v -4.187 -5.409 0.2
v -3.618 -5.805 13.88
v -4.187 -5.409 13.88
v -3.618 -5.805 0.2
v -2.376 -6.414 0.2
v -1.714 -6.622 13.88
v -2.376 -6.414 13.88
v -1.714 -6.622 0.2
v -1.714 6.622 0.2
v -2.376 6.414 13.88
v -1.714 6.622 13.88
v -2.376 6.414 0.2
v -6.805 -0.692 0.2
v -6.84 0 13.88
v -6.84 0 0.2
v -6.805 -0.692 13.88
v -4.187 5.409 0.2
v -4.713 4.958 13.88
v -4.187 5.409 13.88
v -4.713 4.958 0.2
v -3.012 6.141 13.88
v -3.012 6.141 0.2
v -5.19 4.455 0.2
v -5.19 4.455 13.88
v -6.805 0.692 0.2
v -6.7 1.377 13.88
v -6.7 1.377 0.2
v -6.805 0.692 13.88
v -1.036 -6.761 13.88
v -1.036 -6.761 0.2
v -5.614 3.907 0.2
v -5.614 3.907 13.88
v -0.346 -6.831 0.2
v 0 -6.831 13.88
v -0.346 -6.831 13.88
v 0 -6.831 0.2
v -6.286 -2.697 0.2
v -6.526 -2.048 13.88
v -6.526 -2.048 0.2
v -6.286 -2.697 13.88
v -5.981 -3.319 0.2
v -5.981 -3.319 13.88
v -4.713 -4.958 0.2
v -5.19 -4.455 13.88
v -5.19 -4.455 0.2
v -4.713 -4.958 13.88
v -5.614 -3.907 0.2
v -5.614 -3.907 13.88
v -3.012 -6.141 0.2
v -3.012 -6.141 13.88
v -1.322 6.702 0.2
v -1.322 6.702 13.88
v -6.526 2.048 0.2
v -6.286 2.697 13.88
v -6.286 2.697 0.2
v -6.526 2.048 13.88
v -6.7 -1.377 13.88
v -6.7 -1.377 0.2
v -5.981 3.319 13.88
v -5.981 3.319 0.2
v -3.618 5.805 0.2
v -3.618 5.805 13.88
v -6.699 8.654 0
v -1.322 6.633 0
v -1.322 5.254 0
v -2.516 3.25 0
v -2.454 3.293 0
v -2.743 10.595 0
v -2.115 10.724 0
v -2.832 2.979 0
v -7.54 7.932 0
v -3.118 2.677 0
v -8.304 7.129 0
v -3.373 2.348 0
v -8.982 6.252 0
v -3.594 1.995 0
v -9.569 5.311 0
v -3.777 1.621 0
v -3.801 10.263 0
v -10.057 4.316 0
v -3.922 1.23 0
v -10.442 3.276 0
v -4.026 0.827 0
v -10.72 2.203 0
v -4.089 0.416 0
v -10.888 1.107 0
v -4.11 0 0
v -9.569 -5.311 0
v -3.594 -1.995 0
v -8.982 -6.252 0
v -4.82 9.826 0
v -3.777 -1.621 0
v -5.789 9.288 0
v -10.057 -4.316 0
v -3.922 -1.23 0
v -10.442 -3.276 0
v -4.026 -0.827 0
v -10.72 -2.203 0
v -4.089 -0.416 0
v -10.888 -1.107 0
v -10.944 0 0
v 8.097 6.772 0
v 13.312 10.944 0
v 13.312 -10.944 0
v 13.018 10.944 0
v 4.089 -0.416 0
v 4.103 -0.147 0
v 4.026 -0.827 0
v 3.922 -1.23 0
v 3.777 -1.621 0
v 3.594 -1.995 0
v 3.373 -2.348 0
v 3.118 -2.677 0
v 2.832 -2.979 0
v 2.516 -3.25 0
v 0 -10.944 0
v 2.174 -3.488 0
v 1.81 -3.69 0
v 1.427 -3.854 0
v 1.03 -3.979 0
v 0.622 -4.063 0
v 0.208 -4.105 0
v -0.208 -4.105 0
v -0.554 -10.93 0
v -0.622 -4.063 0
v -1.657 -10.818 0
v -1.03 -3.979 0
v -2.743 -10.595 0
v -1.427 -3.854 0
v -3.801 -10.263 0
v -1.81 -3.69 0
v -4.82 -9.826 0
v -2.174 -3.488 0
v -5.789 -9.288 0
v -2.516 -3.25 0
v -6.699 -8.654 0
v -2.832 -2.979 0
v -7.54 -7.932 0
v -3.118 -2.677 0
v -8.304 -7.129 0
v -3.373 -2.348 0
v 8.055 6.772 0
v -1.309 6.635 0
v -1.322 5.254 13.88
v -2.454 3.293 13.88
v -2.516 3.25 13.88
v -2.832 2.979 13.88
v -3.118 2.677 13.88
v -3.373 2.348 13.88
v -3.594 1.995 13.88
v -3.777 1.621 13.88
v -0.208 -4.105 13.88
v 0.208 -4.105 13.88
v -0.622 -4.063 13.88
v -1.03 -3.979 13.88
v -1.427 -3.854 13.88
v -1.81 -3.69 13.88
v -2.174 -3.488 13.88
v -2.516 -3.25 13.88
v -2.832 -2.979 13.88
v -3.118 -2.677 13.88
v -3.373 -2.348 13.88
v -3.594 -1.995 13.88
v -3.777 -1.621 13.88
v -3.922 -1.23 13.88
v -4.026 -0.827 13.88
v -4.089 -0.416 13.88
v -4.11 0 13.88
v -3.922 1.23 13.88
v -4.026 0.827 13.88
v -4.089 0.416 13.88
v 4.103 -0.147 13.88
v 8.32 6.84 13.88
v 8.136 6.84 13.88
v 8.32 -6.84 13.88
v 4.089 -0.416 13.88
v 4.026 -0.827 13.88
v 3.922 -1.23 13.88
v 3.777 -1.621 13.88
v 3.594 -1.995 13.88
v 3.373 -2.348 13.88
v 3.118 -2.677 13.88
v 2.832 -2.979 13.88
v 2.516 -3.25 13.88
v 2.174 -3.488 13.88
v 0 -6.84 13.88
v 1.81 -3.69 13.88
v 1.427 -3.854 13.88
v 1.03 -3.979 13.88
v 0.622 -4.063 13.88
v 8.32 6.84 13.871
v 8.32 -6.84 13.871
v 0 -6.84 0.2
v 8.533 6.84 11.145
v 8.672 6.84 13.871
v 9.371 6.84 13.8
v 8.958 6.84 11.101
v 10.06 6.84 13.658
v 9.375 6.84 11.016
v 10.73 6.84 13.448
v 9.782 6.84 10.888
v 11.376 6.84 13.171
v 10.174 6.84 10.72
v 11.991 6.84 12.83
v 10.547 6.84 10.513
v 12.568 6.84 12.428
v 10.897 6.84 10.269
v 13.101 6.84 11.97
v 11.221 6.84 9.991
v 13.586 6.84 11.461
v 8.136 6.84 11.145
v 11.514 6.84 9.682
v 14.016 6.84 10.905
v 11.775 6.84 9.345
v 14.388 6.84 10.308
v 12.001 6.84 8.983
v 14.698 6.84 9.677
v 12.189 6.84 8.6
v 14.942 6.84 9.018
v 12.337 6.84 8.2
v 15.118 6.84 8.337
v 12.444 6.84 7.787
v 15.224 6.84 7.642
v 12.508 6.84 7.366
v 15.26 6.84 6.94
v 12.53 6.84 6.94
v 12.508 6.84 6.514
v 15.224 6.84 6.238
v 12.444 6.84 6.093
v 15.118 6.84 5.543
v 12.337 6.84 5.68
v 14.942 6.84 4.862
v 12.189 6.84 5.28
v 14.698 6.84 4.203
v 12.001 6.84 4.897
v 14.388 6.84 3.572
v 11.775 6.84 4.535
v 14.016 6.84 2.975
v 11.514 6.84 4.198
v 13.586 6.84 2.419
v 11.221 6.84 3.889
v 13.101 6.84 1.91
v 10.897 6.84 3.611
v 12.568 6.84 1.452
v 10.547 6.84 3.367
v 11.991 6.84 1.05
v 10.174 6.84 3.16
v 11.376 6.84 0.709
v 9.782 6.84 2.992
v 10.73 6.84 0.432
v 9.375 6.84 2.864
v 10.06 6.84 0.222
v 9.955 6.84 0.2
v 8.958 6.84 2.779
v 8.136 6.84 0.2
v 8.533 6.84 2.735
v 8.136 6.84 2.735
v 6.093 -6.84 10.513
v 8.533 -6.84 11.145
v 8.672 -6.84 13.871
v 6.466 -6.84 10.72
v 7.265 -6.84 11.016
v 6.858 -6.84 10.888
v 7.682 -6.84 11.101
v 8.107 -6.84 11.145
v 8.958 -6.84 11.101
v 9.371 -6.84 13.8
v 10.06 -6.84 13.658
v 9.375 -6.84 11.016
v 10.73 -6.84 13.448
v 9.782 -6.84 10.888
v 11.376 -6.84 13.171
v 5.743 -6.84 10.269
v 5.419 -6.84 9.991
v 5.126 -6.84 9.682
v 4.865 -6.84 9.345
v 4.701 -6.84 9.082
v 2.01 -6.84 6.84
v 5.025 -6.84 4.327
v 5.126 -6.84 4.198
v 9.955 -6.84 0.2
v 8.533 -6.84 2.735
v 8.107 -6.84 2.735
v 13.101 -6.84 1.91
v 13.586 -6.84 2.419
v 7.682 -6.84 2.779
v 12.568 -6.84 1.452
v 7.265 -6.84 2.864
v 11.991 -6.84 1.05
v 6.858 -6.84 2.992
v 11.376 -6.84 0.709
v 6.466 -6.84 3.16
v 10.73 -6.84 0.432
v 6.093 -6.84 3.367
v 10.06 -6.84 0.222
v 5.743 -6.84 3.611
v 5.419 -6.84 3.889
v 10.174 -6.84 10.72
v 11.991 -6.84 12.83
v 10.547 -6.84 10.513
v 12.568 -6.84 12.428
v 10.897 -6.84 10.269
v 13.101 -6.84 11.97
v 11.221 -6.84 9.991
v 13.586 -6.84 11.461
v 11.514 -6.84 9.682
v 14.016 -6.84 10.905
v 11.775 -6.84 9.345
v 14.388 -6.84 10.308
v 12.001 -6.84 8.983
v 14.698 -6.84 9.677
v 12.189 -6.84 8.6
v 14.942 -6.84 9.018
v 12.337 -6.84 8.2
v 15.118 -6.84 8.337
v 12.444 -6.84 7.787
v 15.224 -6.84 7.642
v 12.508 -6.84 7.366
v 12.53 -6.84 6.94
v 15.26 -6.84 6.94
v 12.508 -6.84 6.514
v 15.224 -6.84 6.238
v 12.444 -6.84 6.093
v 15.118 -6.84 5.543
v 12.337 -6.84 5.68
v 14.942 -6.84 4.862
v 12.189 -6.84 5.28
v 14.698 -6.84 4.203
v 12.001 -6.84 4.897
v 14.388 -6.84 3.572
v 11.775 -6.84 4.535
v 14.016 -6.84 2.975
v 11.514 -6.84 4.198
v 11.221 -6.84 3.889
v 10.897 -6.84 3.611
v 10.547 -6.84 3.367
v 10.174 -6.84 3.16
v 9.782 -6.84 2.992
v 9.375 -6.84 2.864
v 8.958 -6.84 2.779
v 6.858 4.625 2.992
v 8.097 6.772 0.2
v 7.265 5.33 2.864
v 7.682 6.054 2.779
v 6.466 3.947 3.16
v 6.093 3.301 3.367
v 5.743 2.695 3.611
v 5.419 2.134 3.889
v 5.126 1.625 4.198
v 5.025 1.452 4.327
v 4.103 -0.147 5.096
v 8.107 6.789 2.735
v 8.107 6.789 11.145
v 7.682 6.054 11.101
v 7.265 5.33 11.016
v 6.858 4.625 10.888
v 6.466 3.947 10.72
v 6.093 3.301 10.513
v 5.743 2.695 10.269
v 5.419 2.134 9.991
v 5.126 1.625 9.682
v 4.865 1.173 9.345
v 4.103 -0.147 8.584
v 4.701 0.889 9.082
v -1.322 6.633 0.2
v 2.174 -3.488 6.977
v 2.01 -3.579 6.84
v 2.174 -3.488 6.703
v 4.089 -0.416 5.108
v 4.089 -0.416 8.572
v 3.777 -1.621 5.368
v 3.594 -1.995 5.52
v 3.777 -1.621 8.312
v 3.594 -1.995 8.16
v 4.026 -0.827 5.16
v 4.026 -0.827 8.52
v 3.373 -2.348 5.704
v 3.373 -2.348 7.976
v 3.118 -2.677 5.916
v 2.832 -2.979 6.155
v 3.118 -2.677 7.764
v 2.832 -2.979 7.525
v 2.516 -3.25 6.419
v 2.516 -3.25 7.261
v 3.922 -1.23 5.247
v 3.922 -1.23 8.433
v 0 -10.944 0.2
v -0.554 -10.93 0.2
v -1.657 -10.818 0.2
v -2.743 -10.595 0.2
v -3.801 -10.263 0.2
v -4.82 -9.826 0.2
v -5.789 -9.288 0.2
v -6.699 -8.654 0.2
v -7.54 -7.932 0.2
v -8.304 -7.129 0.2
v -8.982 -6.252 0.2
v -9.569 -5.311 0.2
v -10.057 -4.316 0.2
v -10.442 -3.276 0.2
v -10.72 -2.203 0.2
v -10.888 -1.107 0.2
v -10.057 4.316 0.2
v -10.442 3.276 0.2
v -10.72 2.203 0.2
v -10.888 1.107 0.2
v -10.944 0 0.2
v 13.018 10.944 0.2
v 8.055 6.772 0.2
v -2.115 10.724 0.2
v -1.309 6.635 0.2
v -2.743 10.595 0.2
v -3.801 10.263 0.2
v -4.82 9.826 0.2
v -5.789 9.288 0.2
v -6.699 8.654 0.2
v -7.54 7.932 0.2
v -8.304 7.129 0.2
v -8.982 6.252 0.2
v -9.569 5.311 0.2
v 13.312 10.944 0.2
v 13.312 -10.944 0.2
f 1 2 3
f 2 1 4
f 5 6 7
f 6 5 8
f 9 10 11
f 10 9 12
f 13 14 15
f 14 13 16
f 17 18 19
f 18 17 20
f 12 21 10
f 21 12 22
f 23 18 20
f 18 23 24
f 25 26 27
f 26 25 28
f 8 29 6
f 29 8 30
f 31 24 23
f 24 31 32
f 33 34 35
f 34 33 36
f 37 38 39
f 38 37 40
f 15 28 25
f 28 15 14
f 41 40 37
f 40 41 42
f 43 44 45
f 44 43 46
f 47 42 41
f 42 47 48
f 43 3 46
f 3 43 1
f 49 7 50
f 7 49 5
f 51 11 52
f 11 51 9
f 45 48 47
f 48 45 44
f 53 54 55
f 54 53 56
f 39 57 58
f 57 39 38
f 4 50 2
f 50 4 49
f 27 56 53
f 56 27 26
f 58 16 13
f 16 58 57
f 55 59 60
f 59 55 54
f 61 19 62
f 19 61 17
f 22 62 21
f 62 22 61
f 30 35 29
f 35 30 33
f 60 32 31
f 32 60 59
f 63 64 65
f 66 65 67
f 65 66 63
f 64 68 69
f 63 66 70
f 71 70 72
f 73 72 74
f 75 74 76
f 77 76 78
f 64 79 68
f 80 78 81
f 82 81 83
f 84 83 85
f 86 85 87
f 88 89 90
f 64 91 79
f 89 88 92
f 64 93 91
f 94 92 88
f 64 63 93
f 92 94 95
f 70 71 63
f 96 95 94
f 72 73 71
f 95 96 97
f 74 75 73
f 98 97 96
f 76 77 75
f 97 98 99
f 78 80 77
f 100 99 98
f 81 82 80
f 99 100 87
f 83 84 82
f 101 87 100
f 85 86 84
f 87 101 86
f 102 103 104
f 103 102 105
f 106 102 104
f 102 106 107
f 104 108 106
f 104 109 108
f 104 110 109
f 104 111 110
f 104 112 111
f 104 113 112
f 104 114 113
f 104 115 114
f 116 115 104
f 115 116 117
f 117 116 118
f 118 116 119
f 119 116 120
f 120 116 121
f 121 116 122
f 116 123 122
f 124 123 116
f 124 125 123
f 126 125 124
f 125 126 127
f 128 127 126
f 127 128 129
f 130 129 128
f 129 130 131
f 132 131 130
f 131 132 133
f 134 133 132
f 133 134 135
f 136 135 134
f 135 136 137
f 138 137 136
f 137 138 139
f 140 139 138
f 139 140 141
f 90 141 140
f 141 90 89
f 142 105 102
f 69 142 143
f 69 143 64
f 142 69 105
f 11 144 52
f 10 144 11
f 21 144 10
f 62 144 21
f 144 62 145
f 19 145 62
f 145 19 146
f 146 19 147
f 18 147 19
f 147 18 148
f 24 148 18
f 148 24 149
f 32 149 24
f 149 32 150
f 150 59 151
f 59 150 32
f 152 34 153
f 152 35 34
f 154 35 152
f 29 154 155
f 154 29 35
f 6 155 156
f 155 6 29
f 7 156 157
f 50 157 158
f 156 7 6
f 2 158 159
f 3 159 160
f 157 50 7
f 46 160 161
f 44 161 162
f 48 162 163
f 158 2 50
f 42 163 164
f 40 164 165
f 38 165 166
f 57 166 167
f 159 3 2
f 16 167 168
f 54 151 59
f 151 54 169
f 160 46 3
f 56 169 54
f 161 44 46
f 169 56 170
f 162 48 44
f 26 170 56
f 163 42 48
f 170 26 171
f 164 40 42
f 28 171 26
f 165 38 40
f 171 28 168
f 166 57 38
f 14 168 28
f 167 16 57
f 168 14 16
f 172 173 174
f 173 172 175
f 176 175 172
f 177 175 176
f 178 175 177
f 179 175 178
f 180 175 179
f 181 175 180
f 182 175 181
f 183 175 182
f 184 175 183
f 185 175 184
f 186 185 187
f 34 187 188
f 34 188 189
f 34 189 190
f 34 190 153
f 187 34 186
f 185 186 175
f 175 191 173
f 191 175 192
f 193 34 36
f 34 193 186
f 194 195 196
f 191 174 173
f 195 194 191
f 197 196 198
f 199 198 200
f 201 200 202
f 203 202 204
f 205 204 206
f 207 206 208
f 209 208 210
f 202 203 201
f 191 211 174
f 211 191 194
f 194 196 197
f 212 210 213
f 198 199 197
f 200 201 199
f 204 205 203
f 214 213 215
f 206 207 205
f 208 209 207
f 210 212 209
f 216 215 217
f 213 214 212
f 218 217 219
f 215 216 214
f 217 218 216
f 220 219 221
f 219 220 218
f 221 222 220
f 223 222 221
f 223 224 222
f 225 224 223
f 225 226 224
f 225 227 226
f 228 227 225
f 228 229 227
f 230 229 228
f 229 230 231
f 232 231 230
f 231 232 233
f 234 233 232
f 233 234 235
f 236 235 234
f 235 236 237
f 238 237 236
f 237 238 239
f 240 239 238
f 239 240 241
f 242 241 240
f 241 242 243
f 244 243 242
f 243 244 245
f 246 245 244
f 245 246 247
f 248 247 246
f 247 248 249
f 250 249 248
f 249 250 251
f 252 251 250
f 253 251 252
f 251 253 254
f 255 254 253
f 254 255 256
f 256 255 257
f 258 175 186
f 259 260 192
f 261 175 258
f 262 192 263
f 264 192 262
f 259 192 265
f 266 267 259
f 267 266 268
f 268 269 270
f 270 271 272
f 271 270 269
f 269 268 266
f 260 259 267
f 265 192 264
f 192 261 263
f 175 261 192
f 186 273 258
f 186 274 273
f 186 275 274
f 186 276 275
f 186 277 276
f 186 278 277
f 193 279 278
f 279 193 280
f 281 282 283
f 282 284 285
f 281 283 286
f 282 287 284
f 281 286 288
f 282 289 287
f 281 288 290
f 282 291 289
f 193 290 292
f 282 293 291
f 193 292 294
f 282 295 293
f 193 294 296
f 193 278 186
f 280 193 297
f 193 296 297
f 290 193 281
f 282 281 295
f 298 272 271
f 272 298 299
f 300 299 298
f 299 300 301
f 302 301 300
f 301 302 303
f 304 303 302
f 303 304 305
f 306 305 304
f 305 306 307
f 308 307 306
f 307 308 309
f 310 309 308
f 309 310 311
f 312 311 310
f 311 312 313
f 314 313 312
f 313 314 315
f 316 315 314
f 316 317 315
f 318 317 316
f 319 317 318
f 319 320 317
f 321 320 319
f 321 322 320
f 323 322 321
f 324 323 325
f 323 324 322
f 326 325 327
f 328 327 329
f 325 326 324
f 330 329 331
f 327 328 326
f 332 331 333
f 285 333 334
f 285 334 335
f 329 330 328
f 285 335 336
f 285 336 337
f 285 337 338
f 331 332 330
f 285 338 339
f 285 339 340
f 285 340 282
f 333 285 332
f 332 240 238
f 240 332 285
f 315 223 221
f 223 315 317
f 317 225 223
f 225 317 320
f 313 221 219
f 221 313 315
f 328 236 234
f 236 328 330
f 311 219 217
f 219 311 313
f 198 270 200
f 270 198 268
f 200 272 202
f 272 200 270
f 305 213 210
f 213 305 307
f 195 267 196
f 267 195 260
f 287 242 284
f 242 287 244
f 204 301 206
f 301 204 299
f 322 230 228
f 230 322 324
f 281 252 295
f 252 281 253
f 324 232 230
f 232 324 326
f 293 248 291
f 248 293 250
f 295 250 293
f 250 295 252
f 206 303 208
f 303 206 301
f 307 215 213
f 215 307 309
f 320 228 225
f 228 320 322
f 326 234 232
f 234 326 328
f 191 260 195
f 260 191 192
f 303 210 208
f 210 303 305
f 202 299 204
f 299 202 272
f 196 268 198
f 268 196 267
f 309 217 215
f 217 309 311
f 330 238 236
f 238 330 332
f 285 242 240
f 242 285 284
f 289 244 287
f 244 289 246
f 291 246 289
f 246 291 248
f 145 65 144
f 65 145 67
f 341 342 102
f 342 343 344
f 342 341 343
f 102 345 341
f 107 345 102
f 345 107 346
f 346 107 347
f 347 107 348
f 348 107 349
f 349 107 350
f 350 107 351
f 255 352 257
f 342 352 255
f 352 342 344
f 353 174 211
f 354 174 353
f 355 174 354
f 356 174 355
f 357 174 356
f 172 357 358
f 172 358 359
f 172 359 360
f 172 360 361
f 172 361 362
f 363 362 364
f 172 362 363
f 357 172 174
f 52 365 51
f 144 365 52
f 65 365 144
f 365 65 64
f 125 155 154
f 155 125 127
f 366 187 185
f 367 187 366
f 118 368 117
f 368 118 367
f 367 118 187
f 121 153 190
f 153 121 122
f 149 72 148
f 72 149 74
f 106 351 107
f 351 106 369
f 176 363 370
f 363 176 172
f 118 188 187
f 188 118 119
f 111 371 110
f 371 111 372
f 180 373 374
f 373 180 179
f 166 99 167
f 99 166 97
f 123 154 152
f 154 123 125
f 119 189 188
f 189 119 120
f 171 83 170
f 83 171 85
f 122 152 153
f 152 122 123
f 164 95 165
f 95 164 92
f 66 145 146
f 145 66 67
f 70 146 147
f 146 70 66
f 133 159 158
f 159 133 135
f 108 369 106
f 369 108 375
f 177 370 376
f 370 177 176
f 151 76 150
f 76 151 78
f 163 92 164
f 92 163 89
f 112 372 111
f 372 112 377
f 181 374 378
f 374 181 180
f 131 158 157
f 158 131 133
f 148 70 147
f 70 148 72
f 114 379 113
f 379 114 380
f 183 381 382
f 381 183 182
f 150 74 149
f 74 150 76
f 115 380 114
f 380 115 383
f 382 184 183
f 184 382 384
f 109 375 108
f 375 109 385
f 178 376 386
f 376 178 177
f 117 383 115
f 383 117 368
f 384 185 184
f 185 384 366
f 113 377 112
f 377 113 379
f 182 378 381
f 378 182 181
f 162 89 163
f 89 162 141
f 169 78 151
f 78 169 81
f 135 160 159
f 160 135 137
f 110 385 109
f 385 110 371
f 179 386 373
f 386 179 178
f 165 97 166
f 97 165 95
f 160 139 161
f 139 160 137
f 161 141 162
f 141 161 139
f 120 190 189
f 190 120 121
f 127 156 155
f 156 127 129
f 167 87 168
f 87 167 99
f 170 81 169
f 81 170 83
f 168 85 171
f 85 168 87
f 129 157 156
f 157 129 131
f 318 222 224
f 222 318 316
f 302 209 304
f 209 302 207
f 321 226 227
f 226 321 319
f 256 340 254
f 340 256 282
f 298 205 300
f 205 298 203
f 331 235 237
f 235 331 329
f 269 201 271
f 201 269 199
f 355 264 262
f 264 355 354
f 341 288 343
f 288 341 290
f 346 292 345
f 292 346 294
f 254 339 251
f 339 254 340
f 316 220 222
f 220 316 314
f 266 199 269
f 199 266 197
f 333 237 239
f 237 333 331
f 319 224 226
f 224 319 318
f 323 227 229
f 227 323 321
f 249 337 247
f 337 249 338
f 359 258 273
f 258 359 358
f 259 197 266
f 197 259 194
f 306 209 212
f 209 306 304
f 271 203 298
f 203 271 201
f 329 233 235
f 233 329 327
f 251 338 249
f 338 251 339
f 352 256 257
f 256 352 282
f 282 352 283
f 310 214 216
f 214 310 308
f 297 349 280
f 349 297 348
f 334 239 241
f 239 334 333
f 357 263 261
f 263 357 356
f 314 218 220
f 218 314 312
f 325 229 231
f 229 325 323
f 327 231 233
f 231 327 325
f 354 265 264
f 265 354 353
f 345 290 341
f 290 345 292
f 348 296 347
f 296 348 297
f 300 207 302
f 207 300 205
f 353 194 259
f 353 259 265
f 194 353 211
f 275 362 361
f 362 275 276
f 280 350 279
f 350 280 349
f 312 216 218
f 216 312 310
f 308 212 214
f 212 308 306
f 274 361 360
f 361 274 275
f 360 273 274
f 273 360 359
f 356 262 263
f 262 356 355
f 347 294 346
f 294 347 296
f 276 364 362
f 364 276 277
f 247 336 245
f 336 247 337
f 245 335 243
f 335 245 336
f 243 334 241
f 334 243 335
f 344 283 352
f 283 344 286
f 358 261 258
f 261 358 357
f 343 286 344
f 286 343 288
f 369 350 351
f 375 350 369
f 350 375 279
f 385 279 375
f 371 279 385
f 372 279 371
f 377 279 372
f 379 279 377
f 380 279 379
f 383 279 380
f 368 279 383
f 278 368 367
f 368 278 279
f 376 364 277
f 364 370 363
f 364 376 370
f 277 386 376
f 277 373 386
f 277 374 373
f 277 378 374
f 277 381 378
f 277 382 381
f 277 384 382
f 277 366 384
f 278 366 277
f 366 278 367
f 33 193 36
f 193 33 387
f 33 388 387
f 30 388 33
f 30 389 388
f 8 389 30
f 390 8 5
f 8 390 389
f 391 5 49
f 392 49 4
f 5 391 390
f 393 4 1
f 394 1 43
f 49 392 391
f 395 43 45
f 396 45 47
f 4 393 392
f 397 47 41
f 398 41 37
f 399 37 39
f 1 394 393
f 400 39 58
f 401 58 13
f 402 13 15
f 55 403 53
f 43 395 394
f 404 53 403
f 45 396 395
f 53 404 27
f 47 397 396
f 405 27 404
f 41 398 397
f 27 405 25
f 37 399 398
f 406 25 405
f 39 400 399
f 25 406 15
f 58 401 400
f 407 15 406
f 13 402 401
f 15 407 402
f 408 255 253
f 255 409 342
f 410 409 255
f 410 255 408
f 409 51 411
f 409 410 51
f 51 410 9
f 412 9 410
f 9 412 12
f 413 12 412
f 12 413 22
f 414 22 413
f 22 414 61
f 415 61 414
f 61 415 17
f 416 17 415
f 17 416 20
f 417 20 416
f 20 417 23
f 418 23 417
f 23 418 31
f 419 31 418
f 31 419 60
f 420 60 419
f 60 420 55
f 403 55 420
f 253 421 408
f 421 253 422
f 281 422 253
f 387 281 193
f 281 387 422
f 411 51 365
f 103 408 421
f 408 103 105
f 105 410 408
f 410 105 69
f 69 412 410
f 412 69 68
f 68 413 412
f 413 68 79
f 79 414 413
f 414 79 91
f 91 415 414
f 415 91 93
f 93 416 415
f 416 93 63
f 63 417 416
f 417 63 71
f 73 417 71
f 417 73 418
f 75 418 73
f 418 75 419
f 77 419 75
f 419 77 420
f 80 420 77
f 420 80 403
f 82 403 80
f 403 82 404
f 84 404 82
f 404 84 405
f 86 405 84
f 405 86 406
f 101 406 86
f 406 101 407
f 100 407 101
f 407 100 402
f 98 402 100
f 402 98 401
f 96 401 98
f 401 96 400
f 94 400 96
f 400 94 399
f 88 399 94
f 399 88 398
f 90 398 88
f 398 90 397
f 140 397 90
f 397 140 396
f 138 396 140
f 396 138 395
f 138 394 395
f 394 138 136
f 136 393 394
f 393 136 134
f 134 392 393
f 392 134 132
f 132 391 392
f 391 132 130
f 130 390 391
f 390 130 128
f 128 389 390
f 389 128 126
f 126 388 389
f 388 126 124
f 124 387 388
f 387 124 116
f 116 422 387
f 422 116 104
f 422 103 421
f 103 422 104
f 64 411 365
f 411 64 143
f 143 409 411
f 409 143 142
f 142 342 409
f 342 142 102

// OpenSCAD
/*
 * New Y Clamp
 *
 * (C) Michel Pollet <buserror@gmail.com>
 *
 * This clamp is made to replace the existing prusa ones; the prusa ones have a tendency to break,
 * and they also make positioning the Y smooth rods very difficult as the rod moves when you turn
 * the M8 nuts on each side. Also, when you break one, you need to disassemble the whole frame to
 * replace it.
 *
 * This one is made to be a bit squat, the 2 rods are in contact with each others so there is no
 * plastic to flex. You can also clip it directly on the rod without disassembling the frame, and
 * once the smooth rod is in, it prevents any unclipping. It also allows you to position the clamp
 * secure one end, and tighened the other with negligeable rod movement.
 *
 * To print, make sure your slicer makes the walls "solid" otherwise it might flex too much. It's
 * also a good idea to print a set of 4, or print slowly to make sure the "bridge" and overhang
 * print nicely..
 *
 * This part is not for commercial distribution without a commercial license acquired from the
 * author. Distribution on a small scale basis (< 50 units) in the Reprap spirit is free of
 * charge on the basis of mentioning the Author with the bill of material, any wider
 * distribution requires my explicit, written permission.
 */
$fn = 62;

// for 0.20mm layer, 0.35mm nozzle 00 this ensures "solid walls"

//extrusionSize = 0.44;	// for 0.20mm layer
//shell = 6 * extrusionSize;
//m8rod = 7.80 / 2;
//m8smooth = 8.0 / 2;

// For 0.3 layer 0.4mm nozzle with slic3r hole width fix
extrusionSize = 0.42;	// for 0.30mm layer
shell = 6 * extrusionSize + extrusionSize/2;
m8rod = 7.80 / 2 + extrusionSize/2;
m8smooth = 8.0 / 2 + extrusionSize/2;

smoothwidth = (m8smooth + shell) * 2;
rodW = (m8rod + shell) * 2;

demo=0;
four=0;
raft=1;	// add easy to cut support underneath

if (four==0) {
	rotate(demo == 1 ? [0,90,0] : [0,0,0]) {
		if (raft == 1 && demo == 0) {
			linear_extrude(height=0.20) difference() {
				scale([1.6,1.6,0])
					projection(cut = true) hull() clamp();
				scale([0.99,0.99,1.01])
					projection(cut = true) hull() clamp();
			}
		}
		clamp(demo=demo);
	}
} else {
	for (row = [0:1]) {
		if (raft == 1) {
			translate([-2 + (row*25),-10,0])	cube([4, 35, 0.20]);
			translate([-10 ,-2 + (row*16),0])	cube([50, 4, 0.20]);
		}
		for (col = [0:1])
			translate([row * 25, col * 16, 0])
				clamp();
	}
}

module clamp(demo=0) 
//translate([-m8rod+2,0,0])
difference() {
	union() {
		cylinder(r = m8rod + shell, h = smoothwidth);
		translate([0, -(m8rod + shell), 0])
			cube(size=[m8rod + m8smooth, rodW, smoothwidth]);
		translate([m8rod + m8smooth, rodW / 2, smoothwidth / 2])
			rotate([90,0,0])
				cylinder(r = m8smooth + shell, h = rodW);
	}

	if (demo==1) % union() {
		assign(WasherR = 16/2,
			WasherH = 1.6,
			NutH = 6.5,
			NutD = 13) {
		translate([0,0,-15])
			cylinder(r = m8rod, h = smoothwidth + 30);
		translate([0,0,-WasherH])
			cylinder(r = WasherR, h = WasherH);
		translate([0,0,-WasherH-NutH])
			nut(d = NutD, h = NutH, horizontal=false);
		}
	}	
	translate([0,0,-1])
		cylinder(r = m8rod, h = smoothwidth + 2);	
	translate([m8rod + m8smooth, (rodW / 2) + 1, smoothwidth / 2])
		rotate([90,0,0]) {
				cylinder(r = m8smooth, h = rodW + 2);
			if (demo==1) translate([0,0,-8])
				% cylinder(r=m8smooth, h =30);
		}

	translate([m8rod -0.5, -1, -1]) {
		rotate([0,0,60])
			cube(size=[rodW, m8rod * 1.8, smoothwidth + 2]);
		rotate([0,0,90])
			cube(size=[rodW, m8rod * 1.2, smoothwidth + 2]);
	}

	translate([m8rod,-m8rod,m8smooth+shell-0.1]) rotate([90,0,0]) scale(0.7)
      linear_extrude( height = 30, center = true)
            polygon(points = [[3.00,-5.00],[3.00,5.00],[-3.00,0.00]], paths = [[0,1,2]]);
}

/*
 * This is used only for demo screenshots, and thus
 * does not infect the main code
 */
// PRUSA Mendel  
// Functions used in many files
// GNU GPL v3
// Josef Průša
// josefprusa@me.com
// prusadjs.cz
// http://www.reprap.org/wiki/Prusa_Mendel
// http://github.com/prusajr/PrusaMendel


module nut(d,h,horizontal=true){
cornerdiameter =  (d / 2) / cos (180 / 6);
cylinder(h = h, r = cornerdiameter, $fn = 6);
if(horizontal){
for(i = [1:6]){
	rotate([0,0,60*i]) translate([-cornerdiameter-0.2,0,0]) rotate([0,0,-45]) cube(size = [2,2,h]);
}}
}
